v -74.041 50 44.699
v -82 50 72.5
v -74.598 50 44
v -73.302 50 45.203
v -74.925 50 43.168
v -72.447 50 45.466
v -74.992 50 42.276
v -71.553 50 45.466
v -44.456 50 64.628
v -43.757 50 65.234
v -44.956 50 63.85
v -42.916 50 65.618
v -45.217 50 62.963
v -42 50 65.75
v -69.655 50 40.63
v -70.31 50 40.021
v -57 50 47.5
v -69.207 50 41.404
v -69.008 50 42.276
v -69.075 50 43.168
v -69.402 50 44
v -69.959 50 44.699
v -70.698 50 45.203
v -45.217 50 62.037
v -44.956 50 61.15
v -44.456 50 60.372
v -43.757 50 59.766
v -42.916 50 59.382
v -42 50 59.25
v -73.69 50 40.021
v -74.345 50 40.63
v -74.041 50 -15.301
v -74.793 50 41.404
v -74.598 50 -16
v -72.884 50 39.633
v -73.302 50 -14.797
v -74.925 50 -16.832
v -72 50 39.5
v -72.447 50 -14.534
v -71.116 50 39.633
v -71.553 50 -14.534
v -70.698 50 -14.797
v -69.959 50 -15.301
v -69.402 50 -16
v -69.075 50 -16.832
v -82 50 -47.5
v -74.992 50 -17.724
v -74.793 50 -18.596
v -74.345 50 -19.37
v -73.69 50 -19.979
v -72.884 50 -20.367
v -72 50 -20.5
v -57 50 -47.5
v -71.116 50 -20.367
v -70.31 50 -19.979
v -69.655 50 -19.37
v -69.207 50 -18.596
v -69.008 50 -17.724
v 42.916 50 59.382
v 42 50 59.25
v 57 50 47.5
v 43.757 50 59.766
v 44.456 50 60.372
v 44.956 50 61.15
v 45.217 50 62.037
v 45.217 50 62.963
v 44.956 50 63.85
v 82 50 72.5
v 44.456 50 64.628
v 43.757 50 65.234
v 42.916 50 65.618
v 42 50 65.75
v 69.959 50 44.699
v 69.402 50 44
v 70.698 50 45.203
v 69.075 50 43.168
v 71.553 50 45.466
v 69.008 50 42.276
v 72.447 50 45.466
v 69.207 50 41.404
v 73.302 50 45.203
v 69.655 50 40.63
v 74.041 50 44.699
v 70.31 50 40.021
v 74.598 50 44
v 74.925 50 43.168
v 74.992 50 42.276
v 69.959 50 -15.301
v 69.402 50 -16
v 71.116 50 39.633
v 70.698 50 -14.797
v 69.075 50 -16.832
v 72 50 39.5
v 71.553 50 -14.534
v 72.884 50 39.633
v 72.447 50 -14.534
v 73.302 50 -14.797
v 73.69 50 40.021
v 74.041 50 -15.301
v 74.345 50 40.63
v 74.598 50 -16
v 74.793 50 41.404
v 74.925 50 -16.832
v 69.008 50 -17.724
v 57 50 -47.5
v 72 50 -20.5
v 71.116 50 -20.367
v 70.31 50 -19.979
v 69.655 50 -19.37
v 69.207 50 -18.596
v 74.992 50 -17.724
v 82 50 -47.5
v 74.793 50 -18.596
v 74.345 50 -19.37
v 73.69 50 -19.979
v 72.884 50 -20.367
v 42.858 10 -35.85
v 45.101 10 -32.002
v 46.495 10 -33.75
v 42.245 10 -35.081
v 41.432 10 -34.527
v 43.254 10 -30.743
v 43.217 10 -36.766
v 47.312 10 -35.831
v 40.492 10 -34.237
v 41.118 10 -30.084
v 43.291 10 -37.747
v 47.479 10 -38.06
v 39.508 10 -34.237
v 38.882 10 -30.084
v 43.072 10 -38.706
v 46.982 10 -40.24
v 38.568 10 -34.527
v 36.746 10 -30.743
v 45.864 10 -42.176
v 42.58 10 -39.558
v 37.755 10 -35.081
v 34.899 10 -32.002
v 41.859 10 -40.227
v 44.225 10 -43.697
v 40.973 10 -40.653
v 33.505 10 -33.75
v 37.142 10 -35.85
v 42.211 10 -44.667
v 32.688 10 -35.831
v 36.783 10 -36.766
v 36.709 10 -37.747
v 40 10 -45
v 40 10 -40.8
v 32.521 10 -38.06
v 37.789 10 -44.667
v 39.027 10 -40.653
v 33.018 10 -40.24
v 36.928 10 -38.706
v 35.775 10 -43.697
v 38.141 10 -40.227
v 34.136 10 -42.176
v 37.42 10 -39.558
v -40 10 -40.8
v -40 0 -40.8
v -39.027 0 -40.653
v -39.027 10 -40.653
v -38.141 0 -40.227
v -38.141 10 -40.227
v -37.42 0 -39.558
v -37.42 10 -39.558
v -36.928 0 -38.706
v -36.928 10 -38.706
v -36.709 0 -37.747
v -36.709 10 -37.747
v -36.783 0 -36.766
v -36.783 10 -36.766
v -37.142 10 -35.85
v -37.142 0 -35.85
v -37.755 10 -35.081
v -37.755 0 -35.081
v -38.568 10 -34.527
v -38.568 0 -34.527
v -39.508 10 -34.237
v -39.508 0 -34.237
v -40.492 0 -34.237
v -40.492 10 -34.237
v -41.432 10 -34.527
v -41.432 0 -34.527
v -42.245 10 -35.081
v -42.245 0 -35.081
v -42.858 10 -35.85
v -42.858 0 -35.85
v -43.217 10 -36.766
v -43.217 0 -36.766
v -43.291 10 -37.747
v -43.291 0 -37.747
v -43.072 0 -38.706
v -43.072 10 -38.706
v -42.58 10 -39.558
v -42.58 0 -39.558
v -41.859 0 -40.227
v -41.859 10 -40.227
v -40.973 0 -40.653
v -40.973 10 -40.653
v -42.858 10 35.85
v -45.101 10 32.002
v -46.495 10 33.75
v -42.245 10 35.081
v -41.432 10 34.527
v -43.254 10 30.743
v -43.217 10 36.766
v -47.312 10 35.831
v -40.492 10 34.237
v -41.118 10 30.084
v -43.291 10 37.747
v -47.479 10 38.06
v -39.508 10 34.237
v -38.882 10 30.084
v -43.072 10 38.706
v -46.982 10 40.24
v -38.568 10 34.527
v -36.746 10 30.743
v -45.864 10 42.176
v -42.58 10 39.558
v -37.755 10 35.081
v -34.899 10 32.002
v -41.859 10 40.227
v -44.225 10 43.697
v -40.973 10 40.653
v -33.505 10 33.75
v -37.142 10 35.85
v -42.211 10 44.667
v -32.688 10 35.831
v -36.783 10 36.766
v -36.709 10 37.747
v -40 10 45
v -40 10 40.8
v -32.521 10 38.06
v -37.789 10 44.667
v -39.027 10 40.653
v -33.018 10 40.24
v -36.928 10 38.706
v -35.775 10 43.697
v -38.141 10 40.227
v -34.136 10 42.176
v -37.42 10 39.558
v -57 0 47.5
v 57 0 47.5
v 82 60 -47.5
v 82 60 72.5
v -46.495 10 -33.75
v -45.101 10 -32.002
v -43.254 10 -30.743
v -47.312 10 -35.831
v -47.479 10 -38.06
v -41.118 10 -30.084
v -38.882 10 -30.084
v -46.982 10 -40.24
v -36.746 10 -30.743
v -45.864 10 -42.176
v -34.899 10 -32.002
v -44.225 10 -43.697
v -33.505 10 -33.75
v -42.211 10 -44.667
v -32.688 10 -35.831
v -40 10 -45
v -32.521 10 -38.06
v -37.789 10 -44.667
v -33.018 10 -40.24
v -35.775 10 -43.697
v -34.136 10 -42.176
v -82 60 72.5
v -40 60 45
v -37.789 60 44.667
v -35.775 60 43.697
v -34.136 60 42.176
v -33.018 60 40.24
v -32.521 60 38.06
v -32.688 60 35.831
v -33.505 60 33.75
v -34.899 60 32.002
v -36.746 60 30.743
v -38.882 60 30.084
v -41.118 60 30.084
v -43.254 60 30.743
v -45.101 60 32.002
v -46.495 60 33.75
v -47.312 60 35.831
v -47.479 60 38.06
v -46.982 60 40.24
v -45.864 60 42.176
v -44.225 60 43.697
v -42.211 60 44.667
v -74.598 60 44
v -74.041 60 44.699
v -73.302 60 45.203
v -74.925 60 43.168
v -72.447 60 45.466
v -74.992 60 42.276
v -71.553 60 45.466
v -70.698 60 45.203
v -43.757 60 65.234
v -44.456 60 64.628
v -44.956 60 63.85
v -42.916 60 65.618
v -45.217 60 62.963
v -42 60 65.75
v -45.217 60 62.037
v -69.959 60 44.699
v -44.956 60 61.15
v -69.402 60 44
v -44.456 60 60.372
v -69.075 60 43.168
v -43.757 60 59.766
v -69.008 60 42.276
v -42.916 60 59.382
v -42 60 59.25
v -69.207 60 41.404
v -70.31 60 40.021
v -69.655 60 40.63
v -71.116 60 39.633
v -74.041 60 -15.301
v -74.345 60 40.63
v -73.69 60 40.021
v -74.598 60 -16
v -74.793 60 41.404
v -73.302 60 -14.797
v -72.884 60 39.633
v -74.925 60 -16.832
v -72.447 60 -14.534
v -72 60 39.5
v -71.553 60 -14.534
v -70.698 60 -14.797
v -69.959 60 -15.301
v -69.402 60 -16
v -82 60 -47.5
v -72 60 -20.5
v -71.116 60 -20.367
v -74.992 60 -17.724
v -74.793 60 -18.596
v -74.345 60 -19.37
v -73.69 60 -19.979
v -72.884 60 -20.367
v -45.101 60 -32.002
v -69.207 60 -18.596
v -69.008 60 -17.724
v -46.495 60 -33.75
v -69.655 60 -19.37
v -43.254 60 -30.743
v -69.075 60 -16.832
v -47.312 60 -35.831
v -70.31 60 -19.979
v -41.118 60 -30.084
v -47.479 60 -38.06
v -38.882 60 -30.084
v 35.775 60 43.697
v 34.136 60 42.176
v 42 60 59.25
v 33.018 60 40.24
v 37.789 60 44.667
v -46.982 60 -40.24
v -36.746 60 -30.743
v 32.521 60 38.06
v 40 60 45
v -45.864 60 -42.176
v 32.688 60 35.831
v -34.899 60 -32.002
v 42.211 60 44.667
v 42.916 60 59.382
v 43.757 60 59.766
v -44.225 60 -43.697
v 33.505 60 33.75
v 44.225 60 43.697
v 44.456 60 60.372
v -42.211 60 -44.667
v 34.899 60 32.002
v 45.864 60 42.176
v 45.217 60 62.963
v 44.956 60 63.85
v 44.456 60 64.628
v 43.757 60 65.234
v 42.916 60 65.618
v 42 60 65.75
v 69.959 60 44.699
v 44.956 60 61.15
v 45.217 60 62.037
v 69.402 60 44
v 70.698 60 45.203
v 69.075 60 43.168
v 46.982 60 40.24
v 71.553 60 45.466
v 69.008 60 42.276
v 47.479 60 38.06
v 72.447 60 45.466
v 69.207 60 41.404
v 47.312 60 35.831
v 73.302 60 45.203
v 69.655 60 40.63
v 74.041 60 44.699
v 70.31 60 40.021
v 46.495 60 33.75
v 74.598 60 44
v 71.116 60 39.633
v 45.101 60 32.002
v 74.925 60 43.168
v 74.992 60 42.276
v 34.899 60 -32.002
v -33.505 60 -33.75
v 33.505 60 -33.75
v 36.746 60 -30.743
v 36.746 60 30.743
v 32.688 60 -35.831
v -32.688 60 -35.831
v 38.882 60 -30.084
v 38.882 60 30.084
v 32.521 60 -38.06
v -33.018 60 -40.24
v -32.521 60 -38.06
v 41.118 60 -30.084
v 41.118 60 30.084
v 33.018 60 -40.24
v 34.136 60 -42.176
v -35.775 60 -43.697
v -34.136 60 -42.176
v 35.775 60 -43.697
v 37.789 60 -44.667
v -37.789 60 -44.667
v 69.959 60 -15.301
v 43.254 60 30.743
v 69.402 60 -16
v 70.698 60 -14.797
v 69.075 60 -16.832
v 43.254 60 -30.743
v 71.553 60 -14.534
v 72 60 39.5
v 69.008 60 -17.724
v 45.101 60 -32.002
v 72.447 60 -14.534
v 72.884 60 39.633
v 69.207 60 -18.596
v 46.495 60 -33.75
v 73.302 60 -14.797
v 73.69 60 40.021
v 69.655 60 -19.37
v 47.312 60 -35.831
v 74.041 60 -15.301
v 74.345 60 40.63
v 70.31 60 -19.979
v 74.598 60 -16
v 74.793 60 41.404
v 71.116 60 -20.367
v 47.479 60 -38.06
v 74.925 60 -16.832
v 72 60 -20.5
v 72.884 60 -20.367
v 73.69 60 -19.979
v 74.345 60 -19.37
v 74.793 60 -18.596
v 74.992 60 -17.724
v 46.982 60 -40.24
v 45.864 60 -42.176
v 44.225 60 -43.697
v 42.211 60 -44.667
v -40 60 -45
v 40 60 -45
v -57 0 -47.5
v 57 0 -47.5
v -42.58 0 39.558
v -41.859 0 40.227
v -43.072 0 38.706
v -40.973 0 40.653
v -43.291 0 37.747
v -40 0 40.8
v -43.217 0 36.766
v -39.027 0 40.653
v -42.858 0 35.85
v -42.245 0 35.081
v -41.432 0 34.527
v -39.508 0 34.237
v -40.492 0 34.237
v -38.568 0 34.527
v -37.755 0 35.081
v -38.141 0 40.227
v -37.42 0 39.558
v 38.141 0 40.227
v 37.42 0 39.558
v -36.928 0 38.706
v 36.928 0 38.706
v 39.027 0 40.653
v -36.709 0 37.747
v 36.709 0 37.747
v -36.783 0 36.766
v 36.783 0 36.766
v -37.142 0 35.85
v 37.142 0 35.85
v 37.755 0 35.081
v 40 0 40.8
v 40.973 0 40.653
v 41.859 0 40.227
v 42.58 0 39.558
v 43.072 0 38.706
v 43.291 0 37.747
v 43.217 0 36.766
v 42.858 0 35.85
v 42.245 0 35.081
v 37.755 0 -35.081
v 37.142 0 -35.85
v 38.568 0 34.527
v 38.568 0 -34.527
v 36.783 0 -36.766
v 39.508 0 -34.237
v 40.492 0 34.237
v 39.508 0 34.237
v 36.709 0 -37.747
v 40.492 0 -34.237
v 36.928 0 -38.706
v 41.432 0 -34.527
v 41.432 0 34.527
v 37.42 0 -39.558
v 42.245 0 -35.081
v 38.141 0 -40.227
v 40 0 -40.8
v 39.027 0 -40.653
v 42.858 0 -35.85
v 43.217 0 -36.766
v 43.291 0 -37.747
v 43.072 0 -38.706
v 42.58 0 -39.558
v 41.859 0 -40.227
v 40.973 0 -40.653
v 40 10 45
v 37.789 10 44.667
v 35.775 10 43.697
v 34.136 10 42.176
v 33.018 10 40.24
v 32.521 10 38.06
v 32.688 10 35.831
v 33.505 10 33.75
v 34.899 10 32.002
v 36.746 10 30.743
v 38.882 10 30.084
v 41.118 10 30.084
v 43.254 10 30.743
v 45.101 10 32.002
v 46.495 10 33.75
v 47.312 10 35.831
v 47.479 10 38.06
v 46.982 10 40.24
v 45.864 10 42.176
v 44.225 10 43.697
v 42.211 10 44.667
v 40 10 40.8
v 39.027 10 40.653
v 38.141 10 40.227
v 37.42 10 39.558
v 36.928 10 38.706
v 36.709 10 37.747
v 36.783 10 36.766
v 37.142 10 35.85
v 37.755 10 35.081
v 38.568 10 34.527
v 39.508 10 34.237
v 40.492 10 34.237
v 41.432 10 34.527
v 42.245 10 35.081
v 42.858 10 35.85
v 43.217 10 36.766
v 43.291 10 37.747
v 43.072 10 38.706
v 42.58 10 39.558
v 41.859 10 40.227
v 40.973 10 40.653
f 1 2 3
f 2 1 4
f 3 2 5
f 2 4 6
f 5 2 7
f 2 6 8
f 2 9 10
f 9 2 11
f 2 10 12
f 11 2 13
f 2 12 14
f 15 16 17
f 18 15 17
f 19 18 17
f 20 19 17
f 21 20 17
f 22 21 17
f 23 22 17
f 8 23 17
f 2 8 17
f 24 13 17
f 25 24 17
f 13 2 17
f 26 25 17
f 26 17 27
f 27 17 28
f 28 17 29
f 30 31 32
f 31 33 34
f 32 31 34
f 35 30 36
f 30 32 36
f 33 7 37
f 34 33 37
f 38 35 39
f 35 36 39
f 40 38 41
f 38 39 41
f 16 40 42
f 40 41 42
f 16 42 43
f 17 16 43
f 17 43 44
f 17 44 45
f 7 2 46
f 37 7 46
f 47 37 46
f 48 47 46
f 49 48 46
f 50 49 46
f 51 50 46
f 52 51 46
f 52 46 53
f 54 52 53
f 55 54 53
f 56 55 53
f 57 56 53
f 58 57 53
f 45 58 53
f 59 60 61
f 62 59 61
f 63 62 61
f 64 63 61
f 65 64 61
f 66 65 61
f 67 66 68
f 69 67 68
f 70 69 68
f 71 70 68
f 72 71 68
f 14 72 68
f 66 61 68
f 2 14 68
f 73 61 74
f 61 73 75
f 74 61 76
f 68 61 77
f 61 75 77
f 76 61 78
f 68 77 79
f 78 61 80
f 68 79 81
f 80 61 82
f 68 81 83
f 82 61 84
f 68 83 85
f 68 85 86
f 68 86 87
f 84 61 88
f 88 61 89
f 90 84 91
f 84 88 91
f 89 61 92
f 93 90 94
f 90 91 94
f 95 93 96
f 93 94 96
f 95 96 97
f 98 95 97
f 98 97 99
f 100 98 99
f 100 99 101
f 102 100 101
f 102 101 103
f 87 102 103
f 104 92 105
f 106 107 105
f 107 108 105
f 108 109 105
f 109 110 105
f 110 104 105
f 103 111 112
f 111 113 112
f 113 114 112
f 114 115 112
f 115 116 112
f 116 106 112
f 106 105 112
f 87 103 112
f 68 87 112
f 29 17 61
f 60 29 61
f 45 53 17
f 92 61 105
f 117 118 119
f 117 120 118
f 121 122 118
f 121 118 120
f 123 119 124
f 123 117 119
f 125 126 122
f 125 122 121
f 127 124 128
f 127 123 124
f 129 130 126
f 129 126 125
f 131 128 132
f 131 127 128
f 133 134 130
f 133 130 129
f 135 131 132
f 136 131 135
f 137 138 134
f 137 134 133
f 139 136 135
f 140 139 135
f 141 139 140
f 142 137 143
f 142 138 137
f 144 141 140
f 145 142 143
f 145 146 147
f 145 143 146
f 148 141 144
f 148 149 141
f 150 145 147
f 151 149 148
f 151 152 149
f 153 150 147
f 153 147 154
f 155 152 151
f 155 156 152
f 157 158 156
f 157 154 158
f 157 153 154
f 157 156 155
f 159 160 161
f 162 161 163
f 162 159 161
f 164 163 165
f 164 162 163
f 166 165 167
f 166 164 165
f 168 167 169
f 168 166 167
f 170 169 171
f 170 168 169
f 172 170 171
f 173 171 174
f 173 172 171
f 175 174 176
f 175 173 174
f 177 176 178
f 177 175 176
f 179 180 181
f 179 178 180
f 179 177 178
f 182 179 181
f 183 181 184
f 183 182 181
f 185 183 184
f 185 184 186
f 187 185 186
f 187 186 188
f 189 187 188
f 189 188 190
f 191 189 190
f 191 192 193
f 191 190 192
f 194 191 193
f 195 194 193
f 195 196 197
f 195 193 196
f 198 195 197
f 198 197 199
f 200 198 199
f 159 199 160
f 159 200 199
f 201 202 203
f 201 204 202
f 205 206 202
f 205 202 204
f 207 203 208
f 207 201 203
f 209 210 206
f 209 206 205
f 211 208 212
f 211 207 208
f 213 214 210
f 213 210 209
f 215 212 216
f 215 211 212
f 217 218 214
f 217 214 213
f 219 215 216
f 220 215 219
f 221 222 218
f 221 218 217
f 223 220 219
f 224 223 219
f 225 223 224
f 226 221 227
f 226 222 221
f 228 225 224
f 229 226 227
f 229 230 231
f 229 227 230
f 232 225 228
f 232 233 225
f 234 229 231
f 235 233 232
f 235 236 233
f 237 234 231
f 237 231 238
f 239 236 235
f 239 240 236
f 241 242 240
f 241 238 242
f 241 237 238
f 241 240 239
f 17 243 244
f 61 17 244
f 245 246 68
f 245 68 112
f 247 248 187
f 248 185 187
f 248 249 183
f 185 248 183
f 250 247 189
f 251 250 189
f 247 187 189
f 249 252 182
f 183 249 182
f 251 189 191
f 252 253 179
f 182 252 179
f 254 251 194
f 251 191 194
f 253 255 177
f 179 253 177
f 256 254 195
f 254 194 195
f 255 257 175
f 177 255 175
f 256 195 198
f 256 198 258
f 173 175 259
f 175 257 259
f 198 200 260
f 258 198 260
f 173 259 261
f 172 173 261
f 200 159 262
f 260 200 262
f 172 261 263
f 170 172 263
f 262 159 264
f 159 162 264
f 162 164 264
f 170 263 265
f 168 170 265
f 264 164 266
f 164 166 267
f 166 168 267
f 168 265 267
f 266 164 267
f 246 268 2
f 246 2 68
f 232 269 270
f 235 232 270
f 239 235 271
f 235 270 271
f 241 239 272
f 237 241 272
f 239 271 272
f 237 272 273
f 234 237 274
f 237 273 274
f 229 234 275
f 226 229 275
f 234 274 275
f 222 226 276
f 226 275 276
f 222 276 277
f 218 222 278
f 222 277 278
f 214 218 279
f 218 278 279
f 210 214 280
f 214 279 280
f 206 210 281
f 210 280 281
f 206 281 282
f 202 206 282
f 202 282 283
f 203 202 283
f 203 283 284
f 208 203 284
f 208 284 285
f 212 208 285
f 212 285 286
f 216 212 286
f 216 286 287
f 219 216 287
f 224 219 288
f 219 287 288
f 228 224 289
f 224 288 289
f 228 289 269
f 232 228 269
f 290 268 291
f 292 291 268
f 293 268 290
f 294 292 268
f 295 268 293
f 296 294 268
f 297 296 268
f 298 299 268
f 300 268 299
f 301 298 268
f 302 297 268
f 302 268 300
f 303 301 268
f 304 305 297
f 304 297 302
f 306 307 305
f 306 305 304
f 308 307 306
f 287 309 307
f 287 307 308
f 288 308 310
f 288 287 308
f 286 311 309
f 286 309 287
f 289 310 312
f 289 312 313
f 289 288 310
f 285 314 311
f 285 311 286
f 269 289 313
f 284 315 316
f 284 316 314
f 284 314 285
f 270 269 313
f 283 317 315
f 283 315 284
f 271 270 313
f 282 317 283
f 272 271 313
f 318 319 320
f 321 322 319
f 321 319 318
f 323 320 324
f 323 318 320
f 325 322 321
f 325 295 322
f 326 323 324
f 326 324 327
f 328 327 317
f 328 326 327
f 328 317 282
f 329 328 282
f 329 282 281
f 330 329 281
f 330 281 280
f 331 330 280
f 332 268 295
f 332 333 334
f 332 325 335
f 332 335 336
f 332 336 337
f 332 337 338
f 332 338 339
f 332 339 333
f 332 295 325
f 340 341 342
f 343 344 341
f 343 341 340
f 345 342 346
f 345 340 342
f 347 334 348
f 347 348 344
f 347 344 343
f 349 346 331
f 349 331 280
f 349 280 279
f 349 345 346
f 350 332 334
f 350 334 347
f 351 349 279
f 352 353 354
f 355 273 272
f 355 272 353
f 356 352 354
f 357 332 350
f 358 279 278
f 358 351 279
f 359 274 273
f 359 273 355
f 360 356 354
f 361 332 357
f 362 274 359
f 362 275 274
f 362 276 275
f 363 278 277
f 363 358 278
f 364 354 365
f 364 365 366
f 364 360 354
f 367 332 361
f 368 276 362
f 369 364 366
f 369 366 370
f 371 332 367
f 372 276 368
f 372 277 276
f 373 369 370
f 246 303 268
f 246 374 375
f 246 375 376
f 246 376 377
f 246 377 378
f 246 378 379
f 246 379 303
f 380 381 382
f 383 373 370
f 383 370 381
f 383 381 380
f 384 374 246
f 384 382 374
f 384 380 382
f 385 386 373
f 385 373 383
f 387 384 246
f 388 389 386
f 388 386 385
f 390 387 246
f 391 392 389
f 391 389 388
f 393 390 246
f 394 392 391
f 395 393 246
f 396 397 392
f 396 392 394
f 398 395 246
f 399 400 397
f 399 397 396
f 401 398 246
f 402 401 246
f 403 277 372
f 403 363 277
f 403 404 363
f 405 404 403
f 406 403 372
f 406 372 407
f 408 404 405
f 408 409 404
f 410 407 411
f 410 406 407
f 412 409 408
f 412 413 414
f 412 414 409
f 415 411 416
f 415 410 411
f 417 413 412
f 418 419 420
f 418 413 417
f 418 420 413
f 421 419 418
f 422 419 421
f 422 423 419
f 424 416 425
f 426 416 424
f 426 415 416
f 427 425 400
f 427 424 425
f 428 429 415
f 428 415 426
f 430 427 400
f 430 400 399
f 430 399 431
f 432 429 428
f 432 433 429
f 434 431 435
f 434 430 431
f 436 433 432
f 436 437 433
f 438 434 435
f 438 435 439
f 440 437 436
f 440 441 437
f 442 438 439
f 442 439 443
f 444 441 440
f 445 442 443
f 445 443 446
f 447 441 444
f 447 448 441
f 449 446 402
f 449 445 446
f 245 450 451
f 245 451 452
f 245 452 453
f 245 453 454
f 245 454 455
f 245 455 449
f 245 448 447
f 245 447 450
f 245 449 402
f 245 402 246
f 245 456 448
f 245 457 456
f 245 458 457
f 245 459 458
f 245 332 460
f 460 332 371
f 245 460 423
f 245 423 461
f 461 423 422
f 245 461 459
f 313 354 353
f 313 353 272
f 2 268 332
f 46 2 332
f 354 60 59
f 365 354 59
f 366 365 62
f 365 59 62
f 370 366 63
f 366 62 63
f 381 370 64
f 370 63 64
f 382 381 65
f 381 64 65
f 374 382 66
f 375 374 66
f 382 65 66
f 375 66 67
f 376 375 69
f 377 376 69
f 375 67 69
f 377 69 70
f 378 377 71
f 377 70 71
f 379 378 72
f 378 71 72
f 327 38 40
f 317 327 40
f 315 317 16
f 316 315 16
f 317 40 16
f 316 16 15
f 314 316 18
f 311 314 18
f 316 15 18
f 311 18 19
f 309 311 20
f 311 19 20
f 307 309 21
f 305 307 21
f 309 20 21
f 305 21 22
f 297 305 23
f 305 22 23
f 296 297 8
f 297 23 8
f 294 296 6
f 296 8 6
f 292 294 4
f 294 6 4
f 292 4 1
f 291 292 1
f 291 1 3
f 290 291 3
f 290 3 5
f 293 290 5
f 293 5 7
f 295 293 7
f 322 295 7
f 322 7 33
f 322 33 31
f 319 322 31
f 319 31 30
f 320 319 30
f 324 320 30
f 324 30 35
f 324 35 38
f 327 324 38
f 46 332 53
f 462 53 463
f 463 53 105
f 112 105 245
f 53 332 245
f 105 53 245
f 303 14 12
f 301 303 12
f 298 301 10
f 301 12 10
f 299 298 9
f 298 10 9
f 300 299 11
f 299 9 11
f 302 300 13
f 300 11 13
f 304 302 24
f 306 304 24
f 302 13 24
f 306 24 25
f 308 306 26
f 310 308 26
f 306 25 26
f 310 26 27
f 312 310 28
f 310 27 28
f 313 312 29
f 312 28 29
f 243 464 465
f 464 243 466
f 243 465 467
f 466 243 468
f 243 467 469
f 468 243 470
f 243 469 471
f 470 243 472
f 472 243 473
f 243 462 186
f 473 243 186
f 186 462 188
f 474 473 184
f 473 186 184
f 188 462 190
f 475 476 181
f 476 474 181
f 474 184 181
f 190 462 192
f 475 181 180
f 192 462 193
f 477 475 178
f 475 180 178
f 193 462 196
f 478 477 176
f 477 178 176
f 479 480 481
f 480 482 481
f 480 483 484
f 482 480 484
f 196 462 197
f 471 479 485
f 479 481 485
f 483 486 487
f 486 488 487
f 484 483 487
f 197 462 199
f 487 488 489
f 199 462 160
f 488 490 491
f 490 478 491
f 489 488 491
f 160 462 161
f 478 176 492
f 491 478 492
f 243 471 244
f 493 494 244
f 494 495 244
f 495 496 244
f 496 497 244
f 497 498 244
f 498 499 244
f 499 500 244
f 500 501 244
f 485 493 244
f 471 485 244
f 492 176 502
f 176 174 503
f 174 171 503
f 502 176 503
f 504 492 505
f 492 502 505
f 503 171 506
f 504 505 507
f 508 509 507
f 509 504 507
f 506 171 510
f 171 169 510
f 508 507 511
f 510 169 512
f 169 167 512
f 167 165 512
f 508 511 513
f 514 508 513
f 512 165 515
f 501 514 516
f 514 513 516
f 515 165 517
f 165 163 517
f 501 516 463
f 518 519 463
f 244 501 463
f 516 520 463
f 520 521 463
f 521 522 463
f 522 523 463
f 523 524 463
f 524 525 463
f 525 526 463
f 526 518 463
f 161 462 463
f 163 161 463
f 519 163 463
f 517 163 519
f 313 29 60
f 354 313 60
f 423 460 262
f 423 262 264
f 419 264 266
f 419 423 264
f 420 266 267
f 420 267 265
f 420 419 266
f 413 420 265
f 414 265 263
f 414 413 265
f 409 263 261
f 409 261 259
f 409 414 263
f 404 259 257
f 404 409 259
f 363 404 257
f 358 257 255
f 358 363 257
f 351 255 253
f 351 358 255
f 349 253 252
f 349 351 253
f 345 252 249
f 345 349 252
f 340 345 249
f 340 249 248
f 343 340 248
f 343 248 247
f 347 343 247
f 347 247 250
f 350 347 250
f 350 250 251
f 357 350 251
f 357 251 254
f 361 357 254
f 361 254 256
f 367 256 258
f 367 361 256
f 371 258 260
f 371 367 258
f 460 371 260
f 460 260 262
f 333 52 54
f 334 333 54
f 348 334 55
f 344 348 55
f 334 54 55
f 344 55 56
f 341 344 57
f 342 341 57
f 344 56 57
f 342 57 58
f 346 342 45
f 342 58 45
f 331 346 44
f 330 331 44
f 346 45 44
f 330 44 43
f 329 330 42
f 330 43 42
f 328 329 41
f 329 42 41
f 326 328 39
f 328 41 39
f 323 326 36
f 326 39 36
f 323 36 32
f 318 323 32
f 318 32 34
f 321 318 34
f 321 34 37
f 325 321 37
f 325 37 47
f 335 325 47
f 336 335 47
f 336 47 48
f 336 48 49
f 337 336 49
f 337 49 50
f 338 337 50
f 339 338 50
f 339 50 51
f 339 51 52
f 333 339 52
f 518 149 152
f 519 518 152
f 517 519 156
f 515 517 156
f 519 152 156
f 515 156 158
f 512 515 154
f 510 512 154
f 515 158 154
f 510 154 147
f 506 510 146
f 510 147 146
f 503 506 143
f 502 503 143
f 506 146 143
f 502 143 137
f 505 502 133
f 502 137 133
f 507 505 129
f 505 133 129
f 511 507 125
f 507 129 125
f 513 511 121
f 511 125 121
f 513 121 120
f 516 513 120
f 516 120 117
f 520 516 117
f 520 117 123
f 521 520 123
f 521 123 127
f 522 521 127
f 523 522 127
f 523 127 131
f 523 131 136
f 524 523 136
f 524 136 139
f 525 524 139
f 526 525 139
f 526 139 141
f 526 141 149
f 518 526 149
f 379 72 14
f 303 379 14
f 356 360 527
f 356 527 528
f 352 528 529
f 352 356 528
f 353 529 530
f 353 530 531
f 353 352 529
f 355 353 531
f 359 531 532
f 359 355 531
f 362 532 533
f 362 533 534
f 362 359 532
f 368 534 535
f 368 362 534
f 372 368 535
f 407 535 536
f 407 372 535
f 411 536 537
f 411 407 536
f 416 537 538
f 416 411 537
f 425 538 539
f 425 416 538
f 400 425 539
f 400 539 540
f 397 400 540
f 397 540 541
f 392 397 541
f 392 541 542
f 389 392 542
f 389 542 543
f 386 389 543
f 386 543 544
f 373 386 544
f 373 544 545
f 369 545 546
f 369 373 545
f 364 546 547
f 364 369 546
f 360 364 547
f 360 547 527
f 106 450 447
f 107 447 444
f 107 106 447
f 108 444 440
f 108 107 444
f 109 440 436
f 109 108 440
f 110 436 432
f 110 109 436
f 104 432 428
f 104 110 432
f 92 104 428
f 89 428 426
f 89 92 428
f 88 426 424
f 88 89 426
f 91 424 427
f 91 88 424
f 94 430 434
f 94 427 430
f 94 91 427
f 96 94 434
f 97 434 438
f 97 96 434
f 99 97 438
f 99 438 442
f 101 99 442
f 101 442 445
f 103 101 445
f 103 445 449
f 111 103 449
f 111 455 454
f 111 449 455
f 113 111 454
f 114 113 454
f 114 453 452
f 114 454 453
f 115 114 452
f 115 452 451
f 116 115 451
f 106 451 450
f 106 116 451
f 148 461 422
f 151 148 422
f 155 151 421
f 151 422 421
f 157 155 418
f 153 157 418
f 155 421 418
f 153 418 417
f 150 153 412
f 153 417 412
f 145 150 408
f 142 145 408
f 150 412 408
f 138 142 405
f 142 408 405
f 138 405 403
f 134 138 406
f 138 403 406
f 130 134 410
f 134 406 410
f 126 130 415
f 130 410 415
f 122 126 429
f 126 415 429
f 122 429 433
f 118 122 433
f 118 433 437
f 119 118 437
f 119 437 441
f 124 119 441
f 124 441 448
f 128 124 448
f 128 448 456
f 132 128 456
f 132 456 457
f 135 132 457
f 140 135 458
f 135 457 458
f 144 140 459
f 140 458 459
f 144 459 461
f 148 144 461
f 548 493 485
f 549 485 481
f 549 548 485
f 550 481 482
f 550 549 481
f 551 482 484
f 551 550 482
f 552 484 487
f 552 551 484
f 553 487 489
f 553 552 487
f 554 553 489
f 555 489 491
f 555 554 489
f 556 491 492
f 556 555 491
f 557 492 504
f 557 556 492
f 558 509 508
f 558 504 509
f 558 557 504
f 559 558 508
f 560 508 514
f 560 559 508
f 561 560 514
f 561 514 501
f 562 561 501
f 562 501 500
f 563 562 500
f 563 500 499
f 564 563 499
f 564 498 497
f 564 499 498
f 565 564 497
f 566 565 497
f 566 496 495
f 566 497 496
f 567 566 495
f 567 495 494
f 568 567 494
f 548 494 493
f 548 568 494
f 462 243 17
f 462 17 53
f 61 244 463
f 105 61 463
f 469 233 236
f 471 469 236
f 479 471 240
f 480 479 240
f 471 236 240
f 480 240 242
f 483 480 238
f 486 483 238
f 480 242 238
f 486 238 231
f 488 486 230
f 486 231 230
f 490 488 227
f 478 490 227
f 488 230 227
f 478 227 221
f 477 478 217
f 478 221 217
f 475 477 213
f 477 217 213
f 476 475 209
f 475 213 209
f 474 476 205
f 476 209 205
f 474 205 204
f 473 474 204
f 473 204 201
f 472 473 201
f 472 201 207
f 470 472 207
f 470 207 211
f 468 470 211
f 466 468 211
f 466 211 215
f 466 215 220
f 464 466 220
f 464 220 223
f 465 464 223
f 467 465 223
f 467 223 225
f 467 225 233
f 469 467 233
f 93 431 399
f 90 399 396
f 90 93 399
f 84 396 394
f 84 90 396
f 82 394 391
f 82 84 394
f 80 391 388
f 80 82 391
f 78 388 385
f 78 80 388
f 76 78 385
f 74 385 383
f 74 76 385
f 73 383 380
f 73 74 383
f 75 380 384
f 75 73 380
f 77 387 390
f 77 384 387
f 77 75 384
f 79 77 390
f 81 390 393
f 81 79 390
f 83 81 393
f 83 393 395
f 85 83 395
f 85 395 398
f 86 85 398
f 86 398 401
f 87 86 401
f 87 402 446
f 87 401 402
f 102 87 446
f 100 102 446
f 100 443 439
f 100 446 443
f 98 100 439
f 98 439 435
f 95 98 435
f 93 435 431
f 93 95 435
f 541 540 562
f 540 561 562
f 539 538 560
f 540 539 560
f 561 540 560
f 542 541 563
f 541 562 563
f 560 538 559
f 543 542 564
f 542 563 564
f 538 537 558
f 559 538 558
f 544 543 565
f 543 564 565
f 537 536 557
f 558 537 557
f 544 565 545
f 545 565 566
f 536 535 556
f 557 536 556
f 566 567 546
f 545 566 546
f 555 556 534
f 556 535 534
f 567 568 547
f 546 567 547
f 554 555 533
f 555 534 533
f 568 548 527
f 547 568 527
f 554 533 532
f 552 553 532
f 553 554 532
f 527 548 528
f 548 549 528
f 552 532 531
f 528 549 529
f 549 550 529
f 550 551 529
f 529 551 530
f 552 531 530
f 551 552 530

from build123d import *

# Parameters (mm, degrees)
SKETCH_1_W               = 114
SKETCH_1_H               = 95
EXTRUDE_1_DEPTH          = 60
SKETCH_7_W               = 114
SKETCH_7_H               = 25
EXTRUDE_3_DEPTH          = 10
SKETCH_14_R              = 7.5
CUT_EXTRUDE_9_DEPTH      = 50
SKETCH_15_R              = 3.3
CUT_EXTRUDE_10_DEPTH     = 50
MIRROR_2_COPY_1_SKETCH_R = 7.5
MIRROR_2_COPY_1_DEPTH    = 50
MIRROR_2_COPY_2_SKETCH_R = 3.3
MIRROR_2_COPY_2_DEPTH    = 50
CUT_EXTRUDE_8_DEPTH      = 10
SKETCH_16_R              = 3
CUT_EXTRUDE_11_DEPTH     = 50


with BuildPart() as part:
    # 草图1 → 凸台-拉伸1 (new body)
    with BuildSketch(Plane(origin=(0, 0, 0), x_dir=(1, 0, 0), z_dir=(0, 1, 0))):
        Rectangle(SKETCH_1_W, SKETCH_1_H)
    extrude(amount=EXTRUDE_1_DEPTH)

    # 草图7 → 凸台-拉伸3 (add)
    with BuildSketch(Plane(origin=(0, 60, 0), x_dir=(1, 0, 0), z_dir=(0, 1, 0))):
        with Locations((0, -60)):
            Rectangle(SKETCH_7_W, SKETCH_7_H)
        Polygon((-82, -72.5), (-82, 47.5), (-57, 47.5), (-57, -47.5), (-57, -72.5), align=None)
        Polygon((57, -72.5), (82, -72.5), (82, 47.5), (57, 47.5), (57, -47.5), align=None)
    extrude(amount=-EXTRUDE_3_DEPTH)

    # 草图14 → 切除-拉伸9 (cut)
    with BuildSketch(Plane(origin=(0, 60, 0), x_dir=(1, 0, 0), z_dir=(0, 1, 0))):
        with Locations(Location((-40, -37.5, 0), (0, 0, 270))):
            Circle(SKETCH_14_R)
    cut_extrude_9 = extrude(amount=-CUT_EXTRUDE_9_DEPTH, mode=Mode.SUBTRACT)

    # 草图15 → 切除-拉伸10 (cut)
    with BuildSketch(Plane(origin=(0, 10, 0), x_dir=(1, 0, 0), z_dir=(0, 1, 0))):
        with Locations(Location((-40, -37.5, 0), (0, 0, 270))):
            Circle(SKETCH_15_R)
    cut_extrude_10 = extrude(amount=-CUT_EXTRUDE_10_DEPTH, mode=Mode.SUBTRACT)

    # 镜向1: 切除-拉伸9, 切除-拉伸10 across plane
    add(cut_extrude_9.mirror(Plane(origin=(0, 0, 0), x_dir=(0, 0, 1), z_dir=(1, 0, 0))), mode=Mode.SUBTRACT)
    add(cut_extrude_10.mirror(Plane(origin=(0, 0, 0), x_dir=(0, 0, 1), z_dir=(1, 0, 0))), mode=Mode.SUBTRACT)

    # 镜向2: 切除-拉伸9, 切除-拉伸10 across plane
    add(cut_extrude_9.mirror(Plane.XY), mode=Mode.SUBTRACT)
    add(cut_extrude_10.mirror(Plane.XY), mode=Mode.SUBTRACT)

    # 镜向2 copy 1 sketch → 镜向2 copy 1 (cut)
    with BuildSketch(Plane(origin=(0, 60, 0), x_dir=(-1, 0, 0), z_dir=(0, 1, 0))):
        with Locations(Location((-40, -37.5, 0), (0, 0, 270))):
            Circle(MIRROR_2_COPY_1_SKETCH_R)
    extrude(amount=-MIRROR_2_COPY_1_DEPTH, mode=Mode.SUBTRACT)

    # 镜向2 copy 2 sketch → 镜向2 copy 2 (cut)
    with BuildSketch(Plane(origin=(0, 10, 0), x_dir=(-1, 0, 0), z_dir=(0, 1, 0))):
        with Locations(Location((-40, -37.5, 0), (0, 0, 270))):
            Circle(MIRROR_2_COPY_2_SKETCH_R)
    extrude(amount=-MIRROR_2_COPY_2_DEPTH, mode=Mode.SUBTRACT)

    # 草图13 → 切除-拉伸8 (cut)
    with BuildSketch(Plane.XZ.offset(-50)):
        with BuildLine():
            Line((-42, 59.25), (42, 59.25))
            ThreePointArc((42, 59.25), (45.25, 62.5), (42, 65.75))
            Line((42, 65.75), (-42, 65.75))
            ThreePointArc((-42, 65.75), (-45.25, 62.5), (-42, 59.25))
        make_face()
    extrude(amount=-CUT_EXTRUDE_8_DEPTH, mode=Mode.SUBTRACT)

    # 草图16 → 切除-拉伸11 (cut)
    with BuildSketch(Plane.XZ.offset(-50)):
        with Locations(Location((-72, -17.5, 0), (0, 0, 270))):
            Circle(SKETCH_16_R)
        with Locations(Location((-72, 42.5, 0), (0, 0, 270))):
            Circle(SKETCH_16_R)
    cut_extrude_11 = extrude(amount=-CUT_EXTRUDE_11_DEPTH, mode=Mode.SUBTRACT)

    # 镜向3: 切除-拉伸11 across plane
    add(cut_extrude_11.mirror(Plane(origin=(0, 0, 0), x_dir=(0, 0, 1), z_dir=(1, 0, 0))), mode=Mode.SUBTRACT)


solid = part.part
